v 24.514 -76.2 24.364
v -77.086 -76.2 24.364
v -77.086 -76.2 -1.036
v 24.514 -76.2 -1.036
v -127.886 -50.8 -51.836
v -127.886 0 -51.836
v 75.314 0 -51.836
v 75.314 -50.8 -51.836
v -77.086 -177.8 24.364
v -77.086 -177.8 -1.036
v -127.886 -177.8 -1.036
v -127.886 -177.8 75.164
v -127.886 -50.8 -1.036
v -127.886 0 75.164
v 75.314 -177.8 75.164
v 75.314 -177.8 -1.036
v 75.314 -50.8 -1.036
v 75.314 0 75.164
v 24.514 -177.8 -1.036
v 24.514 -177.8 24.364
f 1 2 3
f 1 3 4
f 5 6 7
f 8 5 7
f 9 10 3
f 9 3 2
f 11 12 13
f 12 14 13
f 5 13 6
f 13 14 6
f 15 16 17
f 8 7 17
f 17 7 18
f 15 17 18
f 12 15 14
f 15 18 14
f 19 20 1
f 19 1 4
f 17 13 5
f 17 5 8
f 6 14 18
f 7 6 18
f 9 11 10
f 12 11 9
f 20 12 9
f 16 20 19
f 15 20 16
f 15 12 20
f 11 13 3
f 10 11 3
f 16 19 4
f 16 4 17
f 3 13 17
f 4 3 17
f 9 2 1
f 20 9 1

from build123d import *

# Parameters (mm, degrees)
F0_W     = 203.2
F0_H     = 127
F1_DEPTH = 50.8
F2_W     = 203.2
F2_H     = 76.2
F3_DEPTH = 25.4
F5_DEPTH = 101.6


with BuildPart() as f1:
    # F0 (on Front) → F1 (new body)
    with BuildSketch(Plane.XZ):
        with Locations((-26.285635, 11.66383)):
            Rectangle(F0_W, F0_H)
    extrude(amount=F1_DEPTH)

    # F2 (on face) → F3 (join)
    with BuildSketch(Plane.XZ.offset(50.8)):
        with Locations((-26.285635, 37.06383)):
            Rectangle(F2_W, F2_H)
    extrude(amount=F3_DEPTH)

    # F4 (on face) → F5 (join)
    with BuildSketch(Plane.XZ.offset(76.2)):
        Polygon((-77.085635, 24.36383), (24.514365, 24.36383), (24.514365, -1.03617), (75.314365, -1.03617), (75.314365, 75.16383), (-127.885635, 75.16383), (-127.885635, -1.03617), (-77.085635, -1.03617), align=None)
    extrude(amount=F5_DEPTH)


solid = f1.part
